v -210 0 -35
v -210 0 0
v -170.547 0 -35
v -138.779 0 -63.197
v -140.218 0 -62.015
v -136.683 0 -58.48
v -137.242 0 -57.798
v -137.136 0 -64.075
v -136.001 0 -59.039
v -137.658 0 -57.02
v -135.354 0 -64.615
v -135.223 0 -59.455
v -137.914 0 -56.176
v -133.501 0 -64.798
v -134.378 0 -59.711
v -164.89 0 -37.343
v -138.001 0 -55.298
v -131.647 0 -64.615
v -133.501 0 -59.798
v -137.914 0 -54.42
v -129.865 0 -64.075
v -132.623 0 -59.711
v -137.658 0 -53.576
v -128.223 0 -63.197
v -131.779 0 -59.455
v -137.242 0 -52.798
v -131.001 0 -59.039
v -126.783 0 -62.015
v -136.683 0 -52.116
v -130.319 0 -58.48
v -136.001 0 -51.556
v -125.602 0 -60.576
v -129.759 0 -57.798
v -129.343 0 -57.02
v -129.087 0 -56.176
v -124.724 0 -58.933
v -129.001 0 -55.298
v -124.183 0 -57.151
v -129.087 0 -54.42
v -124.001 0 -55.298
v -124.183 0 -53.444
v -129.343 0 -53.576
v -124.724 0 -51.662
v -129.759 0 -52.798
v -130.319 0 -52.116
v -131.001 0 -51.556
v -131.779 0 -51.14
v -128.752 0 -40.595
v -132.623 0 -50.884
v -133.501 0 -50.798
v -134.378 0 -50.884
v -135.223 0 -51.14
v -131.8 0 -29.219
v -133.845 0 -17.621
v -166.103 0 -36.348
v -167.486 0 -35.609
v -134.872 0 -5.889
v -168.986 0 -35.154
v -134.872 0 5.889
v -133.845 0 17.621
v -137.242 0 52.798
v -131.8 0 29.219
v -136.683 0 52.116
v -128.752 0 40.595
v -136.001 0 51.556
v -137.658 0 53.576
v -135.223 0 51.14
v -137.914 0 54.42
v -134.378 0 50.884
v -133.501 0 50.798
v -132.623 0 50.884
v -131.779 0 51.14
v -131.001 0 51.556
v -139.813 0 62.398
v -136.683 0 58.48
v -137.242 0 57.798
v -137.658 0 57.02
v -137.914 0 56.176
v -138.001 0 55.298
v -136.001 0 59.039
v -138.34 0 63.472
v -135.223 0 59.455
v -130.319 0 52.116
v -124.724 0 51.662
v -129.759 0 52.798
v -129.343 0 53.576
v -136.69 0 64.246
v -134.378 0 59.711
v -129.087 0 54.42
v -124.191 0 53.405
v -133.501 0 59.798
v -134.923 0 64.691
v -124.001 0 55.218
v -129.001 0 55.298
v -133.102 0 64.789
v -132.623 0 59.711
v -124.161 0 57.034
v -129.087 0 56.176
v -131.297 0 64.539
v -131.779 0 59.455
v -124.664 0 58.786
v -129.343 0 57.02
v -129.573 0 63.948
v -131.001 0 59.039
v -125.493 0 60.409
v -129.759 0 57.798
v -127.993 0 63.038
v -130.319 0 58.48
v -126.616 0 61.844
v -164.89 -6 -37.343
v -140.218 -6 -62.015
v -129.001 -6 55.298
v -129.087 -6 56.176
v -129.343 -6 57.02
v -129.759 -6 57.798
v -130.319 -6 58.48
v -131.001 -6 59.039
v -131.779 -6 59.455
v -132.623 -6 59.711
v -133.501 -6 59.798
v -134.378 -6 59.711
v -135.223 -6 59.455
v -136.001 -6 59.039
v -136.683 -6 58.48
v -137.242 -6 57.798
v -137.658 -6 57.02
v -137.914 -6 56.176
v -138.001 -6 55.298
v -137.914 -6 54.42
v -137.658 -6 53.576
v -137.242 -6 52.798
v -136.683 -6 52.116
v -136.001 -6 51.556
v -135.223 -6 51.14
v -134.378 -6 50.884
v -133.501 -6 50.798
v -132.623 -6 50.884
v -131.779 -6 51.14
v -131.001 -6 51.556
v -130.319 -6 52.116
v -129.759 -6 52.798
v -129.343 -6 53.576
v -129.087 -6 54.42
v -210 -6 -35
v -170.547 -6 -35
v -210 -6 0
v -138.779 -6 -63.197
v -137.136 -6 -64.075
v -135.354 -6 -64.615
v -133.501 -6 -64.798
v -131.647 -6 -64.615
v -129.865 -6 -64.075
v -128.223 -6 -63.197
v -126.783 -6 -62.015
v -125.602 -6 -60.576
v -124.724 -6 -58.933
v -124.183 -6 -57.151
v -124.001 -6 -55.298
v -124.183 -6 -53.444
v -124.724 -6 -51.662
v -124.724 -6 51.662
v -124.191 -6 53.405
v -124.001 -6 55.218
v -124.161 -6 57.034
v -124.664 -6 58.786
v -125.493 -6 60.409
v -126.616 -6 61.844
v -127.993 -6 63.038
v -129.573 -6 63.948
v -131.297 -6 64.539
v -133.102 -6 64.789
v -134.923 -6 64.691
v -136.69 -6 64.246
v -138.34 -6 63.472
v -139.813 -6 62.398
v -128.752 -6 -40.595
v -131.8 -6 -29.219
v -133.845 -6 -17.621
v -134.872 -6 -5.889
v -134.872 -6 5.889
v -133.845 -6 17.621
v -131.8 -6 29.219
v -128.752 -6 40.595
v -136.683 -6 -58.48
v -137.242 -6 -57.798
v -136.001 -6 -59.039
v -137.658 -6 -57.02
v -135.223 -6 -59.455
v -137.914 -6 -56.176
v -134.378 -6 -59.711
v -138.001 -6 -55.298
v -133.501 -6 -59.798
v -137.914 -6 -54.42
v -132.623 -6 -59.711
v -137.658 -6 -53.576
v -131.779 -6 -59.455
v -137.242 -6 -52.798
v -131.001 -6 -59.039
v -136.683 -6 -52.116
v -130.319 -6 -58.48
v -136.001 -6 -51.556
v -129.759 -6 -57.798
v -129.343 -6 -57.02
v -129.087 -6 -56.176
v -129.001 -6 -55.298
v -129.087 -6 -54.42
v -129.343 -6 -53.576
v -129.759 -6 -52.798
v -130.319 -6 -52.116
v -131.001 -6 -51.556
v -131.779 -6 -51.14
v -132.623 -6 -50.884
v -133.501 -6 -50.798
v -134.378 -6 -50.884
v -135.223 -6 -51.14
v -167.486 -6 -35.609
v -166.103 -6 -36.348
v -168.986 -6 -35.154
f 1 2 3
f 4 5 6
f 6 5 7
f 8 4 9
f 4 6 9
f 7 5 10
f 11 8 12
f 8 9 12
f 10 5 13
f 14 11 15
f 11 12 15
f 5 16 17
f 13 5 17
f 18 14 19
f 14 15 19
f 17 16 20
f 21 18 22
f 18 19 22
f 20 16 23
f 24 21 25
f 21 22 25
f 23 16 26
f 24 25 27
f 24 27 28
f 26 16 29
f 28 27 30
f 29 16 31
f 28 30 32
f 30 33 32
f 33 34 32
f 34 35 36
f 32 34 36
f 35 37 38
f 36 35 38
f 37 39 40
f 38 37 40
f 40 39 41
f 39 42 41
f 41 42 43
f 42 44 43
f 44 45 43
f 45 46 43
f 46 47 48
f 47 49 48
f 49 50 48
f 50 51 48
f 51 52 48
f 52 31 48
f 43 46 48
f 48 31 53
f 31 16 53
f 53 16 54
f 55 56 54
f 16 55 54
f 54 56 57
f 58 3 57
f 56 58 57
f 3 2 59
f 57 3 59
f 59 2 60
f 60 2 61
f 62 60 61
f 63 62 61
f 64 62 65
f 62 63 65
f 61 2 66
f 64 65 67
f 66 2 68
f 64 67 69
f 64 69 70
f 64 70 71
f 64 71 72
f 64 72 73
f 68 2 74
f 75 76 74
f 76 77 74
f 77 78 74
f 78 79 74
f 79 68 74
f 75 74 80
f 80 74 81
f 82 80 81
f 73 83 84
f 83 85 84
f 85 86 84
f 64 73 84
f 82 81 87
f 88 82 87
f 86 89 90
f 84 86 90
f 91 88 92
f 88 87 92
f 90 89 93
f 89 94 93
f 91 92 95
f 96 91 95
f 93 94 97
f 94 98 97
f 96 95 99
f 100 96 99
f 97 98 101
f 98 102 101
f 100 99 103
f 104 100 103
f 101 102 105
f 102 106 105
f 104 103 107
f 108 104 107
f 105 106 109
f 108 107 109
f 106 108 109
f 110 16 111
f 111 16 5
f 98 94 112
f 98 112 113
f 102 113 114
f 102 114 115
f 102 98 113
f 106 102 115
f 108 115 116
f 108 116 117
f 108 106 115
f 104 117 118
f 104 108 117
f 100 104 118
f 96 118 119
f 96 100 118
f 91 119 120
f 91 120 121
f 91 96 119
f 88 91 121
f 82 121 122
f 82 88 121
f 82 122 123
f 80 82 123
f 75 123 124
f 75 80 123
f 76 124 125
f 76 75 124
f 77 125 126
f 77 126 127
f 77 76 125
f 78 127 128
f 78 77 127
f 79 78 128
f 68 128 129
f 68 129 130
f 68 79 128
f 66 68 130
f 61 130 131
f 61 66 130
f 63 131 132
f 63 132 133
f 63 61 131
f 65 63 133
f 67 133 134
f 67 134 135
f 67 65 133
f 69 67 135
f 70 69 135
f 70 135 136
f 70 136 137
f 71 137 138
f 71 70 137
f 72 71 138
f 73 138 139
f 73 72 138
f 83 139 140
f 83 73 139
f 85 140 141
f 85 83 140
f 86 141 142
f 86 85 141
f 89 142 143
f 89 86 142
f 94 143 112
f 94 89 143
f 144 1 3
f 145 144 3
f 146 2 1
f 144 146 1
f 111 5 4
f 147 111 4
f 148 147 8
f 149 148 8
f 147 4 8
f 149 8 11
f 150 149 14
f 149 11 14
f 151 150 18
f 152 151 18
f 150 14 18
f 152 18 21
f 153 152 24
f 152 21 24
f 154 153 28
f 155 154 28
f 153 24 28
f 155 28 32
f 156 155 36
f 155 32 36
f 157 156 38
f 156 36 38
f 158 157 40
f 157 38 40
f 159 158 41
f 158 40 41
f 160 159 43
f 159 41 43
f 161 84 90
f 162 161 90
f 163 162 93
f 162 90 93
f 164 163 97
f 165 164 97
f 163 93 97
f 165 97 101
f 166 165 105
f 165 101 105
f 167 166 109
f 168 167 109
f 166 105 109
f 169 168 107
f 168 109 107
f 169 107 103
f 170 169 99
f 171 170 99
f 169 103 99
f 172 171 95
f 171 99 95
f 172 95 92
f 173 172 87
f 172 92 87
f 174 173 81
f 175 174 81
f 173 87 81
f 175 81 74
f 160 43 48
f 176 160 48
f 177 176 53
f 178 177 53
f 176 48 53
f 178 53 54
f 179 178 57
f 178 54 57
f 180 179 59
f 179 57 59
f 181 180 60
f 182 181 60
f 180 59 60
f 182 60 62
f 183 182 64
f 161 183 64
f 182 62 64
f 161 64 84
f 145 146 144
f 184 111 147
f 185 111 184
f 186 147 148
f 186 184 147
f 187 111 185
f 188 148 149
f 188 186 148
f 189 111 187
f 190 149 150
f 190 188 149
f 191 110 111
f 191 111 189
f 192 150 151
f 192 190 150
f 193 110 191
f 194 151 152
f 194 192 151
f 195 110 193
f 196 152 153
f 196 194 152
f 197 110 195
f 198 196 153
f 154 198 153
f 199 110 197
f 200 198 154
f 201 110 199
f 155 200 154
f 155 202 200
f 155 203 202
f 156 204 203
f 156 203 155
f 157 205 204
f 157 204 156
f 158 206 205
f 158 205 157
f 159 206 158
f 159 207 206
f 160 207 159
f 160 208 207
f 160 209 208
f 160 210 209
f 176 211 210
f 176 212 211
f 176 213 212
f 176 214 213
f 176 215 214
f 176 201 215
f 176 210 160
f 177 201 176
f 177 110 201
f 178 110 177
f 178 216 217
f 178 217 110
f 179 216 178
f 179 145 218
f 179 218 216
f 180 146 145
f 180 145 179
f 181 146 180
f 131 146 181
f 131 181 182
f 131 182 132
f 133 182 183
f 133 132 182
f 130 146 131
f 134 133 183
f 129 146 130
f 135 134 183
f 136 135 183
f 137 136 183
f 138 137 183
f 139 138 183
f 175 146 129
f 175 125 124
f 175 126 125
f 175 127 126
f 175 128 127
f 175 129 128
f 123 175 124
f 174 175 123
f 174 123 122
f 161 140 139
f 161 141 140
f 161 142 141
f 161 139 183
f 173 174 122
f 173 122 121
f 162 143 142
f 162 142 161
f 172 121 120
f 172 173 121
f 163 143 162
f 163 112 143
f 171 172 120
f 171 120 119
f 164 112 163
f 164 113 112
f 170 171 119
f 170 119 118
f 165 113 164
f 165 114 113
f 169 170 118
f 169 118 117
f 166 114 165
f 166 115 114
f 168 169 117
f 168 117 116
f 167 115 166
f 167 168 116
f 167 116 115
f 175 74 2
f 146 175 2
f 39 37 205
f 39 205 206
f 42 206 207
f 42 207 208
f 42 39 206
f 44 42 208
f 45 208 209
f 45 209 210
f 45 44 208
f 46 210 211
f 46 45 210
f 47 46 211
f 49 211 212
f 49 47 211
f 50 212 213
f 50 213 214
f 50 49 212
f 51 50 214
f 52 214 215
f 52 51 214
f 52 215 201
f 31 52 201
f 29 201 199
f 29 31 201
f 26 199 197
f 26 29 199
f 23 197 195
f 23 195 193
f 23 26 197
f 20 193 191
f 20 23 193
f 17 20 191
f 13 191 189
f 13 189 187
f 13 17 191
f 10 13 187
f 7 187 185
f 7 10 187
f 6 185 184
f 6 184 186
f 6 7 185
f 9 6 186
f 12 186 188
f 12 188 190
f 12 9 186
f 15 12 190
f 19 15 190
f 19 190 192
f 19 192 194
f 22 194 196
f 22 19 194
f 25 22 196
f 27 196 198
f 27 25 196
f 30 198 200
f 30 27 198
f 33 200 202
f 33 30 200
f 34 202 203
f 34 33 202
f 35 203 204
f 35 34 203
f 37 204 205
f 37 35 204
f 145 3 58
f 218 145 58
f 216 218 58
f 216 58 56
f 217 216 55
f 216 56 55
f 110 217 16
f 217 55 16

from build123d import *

# Parameters (mm, degrees)
F0_R     = 4.5
F1_DEPTH = 6


with BuildPart() as f1:
    # F0 (on Front) → F1 (new body)
    with BuildSketch(Plane.XZ):
        with BuildLine():
            ThreePointArc((-140.218107, -62.01527), (-128.222675, -63.196717), (-124.723737, -51.662263))
            ThreePointArc((-124.723737, -51.662263), (-135, 0), (-124.723737, 51.662263))
            ThreePointArc((-124.723737, 51.662263), (-127.993204, 63.038471), (-139.812549, 62.3977))
            Line((-139.812549, 62.3977), (-210, 0))
            Line((-210, 0), (-210, -35))
            Line((-210, -35), (-170.547086, -35))
            ThreePointArc((-170.547086, -35), (-167.485618, -35.608964), (-164.890232, -37.343146))
            Line((-164.890232, -37.343146), (-140.218107, -62.01527))
        make_face()
        with Locations((-133.500592, -55.297756)):
            Circle(F0_R, mode=Mode.SUBTRACT)
        with Locations((-133.500592, 55.297756)):
            Circle(F0_R, mode=Mode.SUBTRACT)
    extrude(amount=F1_DEPTH)


solid = f1.part
